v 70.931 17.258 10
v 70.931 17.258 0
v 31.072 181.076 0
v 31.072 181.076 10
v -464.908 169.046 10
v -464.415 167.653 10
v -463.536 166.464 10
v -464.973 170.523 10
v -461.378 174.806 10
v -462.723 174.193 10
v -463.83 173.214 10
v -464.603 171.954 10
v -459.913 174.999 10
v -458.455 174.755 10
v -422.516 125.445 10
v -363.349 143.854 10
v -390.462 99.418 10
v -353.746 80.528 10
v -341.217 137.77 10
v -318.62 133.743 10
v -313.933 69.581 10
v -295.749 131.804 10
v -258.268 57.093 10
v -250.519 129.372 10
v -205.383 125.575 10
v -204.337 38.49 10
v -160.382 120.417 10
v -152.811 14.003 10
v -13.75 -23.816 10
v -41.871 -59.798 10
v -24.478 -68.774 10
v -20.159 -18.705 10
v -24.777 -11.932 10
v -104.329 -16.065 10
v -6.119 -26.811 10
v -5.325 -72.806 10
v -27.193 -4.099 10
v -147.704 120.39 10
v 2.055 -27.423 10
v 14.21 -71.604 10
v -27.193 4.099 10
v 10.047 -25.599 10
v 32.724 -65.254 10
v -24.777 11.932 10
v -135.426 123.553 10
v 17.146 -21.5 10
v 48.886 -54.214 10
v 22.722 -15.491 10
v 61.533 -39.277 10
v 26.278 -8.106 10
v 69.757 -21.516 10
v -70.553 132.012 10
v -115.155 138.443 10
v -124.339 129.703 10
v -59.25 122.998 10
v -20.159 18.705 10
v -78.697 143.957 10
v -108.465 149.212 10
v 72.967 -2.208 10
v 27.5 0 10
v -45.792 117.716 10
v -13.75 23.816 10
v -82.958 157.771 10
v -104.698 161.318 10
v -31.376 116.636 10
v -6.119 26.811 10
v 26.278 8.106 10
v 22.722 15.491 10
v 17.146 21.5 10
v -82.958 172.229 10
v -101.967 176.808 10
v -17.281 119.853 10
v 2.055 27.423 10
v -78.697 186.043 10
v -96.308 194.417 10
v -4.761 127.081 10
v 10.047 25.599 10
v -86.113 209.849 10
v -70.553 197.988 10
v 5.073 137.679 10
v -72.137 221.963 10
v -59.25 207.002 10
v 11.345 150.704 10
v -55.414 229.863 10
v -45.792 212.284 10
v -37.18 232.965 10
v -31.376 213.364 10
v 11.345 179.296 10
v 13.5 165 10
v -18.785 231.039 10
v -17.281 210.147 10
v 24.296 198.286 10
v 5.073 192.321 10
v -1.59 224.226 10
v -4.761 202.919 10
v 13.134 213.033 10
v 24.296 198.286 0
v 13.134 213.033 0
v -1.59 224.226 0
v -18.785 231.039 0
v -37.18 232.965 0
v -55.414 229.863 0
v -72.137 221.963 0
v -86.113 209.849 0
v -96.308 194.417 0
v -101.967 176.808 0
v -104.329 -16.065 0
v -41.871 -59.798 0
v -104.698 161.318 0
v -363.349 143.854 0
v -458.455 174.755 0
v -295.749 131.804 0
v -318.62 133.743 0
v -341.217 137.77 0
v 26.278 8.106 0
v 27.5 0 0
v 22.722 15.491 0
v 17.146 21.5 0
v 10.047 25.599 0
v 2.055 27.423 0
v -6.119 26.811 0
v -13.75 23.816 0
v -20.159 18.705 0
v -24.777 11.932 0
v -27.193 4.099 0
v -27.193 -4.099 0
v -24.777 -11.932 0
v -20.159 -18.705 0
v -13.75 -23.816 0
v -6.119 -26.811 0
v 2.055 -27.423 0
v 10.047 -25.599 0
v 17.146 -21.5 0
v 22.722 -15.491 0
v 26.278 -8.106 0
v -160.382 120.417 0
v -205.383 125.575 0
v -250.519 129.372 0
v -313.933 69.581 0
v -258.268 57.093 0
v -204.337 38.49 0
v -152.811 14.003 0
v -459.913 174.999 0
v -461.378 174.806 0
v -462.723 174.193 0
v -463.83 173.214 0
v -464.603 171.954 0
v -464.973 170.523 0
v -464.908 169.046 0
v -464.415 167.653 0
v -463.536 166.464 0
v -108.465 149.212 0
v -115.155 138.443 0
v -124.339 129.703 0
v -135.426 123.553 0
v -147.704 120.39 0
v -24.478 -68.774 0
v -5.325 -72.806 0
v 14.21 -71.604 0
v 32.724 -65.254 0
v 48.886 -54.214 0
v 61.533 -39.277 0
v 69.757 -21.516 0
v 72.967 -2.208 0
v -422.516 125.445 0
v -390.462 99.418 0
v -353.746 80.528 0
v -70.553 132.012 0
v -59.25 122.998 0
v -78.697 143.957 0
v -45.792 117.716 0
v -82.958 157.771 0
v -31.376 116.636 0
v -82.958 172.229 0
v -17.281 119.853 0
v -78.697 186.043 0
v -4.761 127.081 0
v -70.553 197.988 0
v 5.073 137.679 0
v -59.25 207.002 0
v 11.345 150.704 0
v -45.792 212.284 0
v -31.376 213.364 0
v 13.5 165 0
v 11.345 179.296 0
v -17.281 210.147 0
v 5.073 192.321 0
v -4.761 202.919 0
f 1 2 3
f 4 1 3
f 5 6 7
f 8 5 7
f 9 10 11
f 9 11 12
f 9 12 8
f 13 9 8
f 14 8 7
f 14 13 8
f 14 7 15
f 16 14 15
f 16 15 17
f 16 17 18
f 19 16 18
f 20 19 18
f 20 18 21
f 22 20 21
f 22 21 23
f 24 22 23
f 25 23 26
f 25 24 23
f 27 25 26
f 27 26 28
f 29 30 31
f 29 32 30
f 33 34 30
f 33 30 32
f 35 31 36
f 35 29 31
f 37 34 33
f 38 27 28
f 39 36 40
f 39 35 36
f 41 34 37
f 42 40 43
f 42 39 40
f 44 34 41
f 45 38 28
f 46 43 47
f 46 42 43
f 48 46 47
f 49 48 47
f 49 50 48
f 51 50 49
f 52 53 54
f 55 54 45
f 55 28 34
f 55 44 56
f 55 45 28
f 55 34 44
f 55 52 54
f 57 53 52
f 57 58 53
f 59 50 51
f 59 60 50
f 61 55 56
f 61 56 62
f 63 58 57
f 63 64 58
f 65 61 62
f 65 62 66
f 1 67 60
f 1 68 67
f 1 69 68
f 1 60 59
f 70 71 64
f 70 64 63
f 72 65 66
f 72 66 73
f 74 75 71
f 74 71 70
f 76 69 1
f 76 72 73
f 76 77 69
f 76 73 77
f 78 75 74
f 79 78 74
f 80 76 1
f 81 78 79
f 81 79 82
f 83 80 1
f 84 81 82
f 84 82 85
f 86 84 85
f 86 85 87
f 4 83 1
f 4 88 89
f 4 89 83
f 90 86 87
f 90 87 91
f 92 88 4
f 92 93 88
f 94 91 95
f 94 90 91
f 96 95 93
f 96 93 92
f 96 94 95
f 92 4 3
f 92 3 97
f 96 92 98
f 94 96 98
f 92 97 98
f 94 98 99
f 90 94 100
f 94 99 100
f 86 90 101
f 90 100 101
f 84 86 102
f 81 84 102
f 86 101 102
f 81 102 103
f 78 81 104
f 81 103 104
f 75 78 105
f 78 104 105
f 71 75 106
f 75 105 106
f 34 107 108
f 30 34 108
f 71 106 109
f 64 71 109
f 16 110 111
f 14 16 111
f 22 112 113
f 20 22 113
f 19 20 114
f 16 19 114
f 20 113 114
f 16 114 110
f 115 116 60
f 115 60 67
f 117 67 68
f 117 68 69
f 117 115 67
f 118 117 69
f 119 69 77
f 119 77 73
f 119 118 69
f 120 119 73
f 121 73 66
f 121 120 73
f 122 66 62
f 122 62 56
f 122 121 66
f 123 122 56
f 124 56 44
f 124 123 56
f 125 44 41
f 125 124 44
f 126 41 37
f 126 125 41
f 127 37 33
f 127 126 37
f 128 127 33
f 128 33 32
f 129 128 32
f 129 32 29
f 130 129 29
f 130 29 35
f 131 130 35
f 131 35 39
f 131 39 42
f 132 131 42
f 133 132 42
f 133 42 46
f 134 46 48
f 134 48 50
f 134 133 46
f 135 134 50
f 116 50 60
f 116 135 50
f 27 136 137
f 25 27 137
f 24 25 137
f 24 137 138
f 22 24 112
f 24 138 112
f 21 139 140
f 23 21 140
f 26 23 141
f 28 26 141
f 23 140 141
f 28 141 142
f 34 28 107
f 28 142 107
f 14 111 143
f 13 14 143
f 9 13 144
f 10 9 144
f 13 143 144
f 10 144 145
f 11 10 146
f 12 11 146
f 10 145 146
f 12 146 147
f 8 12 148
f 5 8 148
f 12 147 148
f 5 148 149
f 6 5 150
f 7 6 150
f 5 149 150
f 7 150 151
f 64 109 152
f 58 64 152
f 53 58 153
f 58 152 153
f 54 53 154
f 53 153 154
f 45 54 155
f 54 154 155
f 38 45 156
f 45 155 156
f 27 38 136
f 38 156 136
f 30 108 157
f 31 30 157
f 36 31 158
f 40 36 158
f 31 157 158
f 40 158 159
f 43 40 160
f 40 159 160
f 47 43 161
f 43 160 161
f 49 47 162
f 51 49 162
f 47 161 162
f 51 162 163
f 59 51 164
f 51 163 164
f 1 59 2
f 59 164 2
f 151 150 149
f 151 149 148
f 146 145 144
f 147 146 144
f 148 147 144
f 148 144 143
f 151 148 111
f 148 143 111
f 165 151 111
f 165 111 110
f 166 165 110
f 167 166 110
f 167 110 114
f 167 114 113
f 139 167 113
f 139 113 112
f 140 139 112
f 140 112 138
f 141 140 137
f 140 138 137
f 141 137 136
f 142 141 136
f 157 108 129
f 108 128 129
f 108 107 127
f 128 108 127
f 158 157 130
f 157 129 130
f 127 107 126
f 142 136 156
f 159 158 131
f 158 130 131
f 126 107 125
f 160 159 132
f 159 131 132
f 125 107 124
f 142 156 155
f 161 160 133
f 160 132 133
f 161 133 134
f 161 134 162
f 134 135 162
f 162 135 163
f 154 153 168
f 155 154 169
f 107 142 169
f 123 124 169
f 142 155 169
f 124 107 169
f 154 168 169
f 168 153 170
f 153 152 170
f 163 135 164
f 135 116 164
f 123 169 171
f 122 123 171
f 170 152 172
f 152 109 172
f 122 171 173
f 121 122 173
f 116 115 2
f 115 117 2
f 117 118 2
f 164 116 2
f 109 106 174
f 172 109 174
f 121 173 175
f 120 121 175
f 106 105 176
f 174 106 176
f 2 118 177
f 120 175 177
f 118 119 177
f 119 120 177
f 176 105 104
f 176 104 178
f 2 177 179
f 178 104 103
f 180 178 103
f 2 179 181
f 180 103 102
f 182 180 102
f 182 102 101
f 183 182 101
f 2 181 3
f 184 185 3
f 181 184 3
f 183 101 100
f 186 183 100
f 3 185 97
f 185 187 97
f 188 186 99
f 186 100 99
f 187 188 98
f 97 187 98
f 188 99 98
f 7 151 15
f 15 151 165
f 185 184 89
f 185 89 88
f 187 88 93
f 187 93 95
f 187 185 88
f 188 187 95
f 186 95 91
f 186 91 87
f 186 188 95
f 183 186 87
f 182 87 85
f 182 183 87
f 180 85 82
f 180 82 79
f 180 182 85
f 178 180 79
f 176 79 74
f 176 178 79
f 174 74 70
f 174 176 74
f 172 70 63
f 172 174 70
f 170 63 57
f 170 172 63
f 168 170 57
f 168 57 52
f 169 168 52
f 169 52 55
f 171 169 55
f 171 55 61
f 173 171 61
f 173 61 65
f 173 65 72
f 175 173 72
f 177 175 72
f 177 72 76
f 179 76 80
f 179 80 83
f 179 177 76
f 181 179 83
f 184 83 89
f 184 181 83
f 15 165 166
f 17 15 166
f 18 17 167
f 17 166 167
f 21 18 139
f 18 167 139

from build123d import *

# Parameters (mm, degrees)
SKETCH1_R          = 27.5
SKETCH1_R_2        = 48.5
BASE_EXTRUDE_DEPTH = 10


with BuildPart() as part:
    # Sketch1 → Base-Extrude (new body)
    with BuildSketch(Plane.XY):
        with BuildLine():
            Line((70.930675146, 17.258022001), (31.072409725, 181.075965699))
            ThreePointArc((31.072409725, 181.075965699), (-37.180312094, 232.965036888), (-101.966927205, 176.808076081))
            Line((-101.966927205, 176.808076081), (-104.698317648, 161.317591117))
            ThreePointArc((-104.698317648, 161.317591117), (-124.339394775, 129.702595413), (-160.381803445, 120.416872968))
            ThreePointArc((-160.381803445, 120.416872968), (-227.936557036, 127.643740719), (-295.749262378, 131.804190759))
            ThreePointArc((-295.749262378, 131.804190759), (-329.964920671, 135.496946415), (-363.349263399, 143.853583144))
            Line((-363.349263399, 143.853583144), (-458.454915028, 174.755282581))
            ThreePointArc((-458.454915028, 174.755282581), (-464.263200822, 172.612492824), (-463.535533906, 166.464466094))
            Line((-463.535533906, 166.464466094), (-422.516106966, 125.445039154))
            ThreePointArc((-422.516106966, 125.445039154), (-372.592477248, 89.023301508), (-313.933303895, 69.580741007))
            ThreePointArc((-313.933303895, 69.580741007), (-204.337272048, 38.490168586), (-104.328864588, -16.064687542))
            Line((-104.328864588, -16.064687542), (-41.871079854, -59.798099233))
            ThreePointArc((-41.871079854, -59.798099233), (41.176771055, -60.278300619), (70.930675146, 17.258022001))
        make_face()
        Circle(SKETCH1_R, mode=Mode.SUBTRACT)
        with Locations((-35, 165)):
            Circle(SKETCH1_R_2, mode=Mode.SUBTRACT)
    extrude(amount=BASE_EXTRUDE_DEPTH)


solid = part.part
